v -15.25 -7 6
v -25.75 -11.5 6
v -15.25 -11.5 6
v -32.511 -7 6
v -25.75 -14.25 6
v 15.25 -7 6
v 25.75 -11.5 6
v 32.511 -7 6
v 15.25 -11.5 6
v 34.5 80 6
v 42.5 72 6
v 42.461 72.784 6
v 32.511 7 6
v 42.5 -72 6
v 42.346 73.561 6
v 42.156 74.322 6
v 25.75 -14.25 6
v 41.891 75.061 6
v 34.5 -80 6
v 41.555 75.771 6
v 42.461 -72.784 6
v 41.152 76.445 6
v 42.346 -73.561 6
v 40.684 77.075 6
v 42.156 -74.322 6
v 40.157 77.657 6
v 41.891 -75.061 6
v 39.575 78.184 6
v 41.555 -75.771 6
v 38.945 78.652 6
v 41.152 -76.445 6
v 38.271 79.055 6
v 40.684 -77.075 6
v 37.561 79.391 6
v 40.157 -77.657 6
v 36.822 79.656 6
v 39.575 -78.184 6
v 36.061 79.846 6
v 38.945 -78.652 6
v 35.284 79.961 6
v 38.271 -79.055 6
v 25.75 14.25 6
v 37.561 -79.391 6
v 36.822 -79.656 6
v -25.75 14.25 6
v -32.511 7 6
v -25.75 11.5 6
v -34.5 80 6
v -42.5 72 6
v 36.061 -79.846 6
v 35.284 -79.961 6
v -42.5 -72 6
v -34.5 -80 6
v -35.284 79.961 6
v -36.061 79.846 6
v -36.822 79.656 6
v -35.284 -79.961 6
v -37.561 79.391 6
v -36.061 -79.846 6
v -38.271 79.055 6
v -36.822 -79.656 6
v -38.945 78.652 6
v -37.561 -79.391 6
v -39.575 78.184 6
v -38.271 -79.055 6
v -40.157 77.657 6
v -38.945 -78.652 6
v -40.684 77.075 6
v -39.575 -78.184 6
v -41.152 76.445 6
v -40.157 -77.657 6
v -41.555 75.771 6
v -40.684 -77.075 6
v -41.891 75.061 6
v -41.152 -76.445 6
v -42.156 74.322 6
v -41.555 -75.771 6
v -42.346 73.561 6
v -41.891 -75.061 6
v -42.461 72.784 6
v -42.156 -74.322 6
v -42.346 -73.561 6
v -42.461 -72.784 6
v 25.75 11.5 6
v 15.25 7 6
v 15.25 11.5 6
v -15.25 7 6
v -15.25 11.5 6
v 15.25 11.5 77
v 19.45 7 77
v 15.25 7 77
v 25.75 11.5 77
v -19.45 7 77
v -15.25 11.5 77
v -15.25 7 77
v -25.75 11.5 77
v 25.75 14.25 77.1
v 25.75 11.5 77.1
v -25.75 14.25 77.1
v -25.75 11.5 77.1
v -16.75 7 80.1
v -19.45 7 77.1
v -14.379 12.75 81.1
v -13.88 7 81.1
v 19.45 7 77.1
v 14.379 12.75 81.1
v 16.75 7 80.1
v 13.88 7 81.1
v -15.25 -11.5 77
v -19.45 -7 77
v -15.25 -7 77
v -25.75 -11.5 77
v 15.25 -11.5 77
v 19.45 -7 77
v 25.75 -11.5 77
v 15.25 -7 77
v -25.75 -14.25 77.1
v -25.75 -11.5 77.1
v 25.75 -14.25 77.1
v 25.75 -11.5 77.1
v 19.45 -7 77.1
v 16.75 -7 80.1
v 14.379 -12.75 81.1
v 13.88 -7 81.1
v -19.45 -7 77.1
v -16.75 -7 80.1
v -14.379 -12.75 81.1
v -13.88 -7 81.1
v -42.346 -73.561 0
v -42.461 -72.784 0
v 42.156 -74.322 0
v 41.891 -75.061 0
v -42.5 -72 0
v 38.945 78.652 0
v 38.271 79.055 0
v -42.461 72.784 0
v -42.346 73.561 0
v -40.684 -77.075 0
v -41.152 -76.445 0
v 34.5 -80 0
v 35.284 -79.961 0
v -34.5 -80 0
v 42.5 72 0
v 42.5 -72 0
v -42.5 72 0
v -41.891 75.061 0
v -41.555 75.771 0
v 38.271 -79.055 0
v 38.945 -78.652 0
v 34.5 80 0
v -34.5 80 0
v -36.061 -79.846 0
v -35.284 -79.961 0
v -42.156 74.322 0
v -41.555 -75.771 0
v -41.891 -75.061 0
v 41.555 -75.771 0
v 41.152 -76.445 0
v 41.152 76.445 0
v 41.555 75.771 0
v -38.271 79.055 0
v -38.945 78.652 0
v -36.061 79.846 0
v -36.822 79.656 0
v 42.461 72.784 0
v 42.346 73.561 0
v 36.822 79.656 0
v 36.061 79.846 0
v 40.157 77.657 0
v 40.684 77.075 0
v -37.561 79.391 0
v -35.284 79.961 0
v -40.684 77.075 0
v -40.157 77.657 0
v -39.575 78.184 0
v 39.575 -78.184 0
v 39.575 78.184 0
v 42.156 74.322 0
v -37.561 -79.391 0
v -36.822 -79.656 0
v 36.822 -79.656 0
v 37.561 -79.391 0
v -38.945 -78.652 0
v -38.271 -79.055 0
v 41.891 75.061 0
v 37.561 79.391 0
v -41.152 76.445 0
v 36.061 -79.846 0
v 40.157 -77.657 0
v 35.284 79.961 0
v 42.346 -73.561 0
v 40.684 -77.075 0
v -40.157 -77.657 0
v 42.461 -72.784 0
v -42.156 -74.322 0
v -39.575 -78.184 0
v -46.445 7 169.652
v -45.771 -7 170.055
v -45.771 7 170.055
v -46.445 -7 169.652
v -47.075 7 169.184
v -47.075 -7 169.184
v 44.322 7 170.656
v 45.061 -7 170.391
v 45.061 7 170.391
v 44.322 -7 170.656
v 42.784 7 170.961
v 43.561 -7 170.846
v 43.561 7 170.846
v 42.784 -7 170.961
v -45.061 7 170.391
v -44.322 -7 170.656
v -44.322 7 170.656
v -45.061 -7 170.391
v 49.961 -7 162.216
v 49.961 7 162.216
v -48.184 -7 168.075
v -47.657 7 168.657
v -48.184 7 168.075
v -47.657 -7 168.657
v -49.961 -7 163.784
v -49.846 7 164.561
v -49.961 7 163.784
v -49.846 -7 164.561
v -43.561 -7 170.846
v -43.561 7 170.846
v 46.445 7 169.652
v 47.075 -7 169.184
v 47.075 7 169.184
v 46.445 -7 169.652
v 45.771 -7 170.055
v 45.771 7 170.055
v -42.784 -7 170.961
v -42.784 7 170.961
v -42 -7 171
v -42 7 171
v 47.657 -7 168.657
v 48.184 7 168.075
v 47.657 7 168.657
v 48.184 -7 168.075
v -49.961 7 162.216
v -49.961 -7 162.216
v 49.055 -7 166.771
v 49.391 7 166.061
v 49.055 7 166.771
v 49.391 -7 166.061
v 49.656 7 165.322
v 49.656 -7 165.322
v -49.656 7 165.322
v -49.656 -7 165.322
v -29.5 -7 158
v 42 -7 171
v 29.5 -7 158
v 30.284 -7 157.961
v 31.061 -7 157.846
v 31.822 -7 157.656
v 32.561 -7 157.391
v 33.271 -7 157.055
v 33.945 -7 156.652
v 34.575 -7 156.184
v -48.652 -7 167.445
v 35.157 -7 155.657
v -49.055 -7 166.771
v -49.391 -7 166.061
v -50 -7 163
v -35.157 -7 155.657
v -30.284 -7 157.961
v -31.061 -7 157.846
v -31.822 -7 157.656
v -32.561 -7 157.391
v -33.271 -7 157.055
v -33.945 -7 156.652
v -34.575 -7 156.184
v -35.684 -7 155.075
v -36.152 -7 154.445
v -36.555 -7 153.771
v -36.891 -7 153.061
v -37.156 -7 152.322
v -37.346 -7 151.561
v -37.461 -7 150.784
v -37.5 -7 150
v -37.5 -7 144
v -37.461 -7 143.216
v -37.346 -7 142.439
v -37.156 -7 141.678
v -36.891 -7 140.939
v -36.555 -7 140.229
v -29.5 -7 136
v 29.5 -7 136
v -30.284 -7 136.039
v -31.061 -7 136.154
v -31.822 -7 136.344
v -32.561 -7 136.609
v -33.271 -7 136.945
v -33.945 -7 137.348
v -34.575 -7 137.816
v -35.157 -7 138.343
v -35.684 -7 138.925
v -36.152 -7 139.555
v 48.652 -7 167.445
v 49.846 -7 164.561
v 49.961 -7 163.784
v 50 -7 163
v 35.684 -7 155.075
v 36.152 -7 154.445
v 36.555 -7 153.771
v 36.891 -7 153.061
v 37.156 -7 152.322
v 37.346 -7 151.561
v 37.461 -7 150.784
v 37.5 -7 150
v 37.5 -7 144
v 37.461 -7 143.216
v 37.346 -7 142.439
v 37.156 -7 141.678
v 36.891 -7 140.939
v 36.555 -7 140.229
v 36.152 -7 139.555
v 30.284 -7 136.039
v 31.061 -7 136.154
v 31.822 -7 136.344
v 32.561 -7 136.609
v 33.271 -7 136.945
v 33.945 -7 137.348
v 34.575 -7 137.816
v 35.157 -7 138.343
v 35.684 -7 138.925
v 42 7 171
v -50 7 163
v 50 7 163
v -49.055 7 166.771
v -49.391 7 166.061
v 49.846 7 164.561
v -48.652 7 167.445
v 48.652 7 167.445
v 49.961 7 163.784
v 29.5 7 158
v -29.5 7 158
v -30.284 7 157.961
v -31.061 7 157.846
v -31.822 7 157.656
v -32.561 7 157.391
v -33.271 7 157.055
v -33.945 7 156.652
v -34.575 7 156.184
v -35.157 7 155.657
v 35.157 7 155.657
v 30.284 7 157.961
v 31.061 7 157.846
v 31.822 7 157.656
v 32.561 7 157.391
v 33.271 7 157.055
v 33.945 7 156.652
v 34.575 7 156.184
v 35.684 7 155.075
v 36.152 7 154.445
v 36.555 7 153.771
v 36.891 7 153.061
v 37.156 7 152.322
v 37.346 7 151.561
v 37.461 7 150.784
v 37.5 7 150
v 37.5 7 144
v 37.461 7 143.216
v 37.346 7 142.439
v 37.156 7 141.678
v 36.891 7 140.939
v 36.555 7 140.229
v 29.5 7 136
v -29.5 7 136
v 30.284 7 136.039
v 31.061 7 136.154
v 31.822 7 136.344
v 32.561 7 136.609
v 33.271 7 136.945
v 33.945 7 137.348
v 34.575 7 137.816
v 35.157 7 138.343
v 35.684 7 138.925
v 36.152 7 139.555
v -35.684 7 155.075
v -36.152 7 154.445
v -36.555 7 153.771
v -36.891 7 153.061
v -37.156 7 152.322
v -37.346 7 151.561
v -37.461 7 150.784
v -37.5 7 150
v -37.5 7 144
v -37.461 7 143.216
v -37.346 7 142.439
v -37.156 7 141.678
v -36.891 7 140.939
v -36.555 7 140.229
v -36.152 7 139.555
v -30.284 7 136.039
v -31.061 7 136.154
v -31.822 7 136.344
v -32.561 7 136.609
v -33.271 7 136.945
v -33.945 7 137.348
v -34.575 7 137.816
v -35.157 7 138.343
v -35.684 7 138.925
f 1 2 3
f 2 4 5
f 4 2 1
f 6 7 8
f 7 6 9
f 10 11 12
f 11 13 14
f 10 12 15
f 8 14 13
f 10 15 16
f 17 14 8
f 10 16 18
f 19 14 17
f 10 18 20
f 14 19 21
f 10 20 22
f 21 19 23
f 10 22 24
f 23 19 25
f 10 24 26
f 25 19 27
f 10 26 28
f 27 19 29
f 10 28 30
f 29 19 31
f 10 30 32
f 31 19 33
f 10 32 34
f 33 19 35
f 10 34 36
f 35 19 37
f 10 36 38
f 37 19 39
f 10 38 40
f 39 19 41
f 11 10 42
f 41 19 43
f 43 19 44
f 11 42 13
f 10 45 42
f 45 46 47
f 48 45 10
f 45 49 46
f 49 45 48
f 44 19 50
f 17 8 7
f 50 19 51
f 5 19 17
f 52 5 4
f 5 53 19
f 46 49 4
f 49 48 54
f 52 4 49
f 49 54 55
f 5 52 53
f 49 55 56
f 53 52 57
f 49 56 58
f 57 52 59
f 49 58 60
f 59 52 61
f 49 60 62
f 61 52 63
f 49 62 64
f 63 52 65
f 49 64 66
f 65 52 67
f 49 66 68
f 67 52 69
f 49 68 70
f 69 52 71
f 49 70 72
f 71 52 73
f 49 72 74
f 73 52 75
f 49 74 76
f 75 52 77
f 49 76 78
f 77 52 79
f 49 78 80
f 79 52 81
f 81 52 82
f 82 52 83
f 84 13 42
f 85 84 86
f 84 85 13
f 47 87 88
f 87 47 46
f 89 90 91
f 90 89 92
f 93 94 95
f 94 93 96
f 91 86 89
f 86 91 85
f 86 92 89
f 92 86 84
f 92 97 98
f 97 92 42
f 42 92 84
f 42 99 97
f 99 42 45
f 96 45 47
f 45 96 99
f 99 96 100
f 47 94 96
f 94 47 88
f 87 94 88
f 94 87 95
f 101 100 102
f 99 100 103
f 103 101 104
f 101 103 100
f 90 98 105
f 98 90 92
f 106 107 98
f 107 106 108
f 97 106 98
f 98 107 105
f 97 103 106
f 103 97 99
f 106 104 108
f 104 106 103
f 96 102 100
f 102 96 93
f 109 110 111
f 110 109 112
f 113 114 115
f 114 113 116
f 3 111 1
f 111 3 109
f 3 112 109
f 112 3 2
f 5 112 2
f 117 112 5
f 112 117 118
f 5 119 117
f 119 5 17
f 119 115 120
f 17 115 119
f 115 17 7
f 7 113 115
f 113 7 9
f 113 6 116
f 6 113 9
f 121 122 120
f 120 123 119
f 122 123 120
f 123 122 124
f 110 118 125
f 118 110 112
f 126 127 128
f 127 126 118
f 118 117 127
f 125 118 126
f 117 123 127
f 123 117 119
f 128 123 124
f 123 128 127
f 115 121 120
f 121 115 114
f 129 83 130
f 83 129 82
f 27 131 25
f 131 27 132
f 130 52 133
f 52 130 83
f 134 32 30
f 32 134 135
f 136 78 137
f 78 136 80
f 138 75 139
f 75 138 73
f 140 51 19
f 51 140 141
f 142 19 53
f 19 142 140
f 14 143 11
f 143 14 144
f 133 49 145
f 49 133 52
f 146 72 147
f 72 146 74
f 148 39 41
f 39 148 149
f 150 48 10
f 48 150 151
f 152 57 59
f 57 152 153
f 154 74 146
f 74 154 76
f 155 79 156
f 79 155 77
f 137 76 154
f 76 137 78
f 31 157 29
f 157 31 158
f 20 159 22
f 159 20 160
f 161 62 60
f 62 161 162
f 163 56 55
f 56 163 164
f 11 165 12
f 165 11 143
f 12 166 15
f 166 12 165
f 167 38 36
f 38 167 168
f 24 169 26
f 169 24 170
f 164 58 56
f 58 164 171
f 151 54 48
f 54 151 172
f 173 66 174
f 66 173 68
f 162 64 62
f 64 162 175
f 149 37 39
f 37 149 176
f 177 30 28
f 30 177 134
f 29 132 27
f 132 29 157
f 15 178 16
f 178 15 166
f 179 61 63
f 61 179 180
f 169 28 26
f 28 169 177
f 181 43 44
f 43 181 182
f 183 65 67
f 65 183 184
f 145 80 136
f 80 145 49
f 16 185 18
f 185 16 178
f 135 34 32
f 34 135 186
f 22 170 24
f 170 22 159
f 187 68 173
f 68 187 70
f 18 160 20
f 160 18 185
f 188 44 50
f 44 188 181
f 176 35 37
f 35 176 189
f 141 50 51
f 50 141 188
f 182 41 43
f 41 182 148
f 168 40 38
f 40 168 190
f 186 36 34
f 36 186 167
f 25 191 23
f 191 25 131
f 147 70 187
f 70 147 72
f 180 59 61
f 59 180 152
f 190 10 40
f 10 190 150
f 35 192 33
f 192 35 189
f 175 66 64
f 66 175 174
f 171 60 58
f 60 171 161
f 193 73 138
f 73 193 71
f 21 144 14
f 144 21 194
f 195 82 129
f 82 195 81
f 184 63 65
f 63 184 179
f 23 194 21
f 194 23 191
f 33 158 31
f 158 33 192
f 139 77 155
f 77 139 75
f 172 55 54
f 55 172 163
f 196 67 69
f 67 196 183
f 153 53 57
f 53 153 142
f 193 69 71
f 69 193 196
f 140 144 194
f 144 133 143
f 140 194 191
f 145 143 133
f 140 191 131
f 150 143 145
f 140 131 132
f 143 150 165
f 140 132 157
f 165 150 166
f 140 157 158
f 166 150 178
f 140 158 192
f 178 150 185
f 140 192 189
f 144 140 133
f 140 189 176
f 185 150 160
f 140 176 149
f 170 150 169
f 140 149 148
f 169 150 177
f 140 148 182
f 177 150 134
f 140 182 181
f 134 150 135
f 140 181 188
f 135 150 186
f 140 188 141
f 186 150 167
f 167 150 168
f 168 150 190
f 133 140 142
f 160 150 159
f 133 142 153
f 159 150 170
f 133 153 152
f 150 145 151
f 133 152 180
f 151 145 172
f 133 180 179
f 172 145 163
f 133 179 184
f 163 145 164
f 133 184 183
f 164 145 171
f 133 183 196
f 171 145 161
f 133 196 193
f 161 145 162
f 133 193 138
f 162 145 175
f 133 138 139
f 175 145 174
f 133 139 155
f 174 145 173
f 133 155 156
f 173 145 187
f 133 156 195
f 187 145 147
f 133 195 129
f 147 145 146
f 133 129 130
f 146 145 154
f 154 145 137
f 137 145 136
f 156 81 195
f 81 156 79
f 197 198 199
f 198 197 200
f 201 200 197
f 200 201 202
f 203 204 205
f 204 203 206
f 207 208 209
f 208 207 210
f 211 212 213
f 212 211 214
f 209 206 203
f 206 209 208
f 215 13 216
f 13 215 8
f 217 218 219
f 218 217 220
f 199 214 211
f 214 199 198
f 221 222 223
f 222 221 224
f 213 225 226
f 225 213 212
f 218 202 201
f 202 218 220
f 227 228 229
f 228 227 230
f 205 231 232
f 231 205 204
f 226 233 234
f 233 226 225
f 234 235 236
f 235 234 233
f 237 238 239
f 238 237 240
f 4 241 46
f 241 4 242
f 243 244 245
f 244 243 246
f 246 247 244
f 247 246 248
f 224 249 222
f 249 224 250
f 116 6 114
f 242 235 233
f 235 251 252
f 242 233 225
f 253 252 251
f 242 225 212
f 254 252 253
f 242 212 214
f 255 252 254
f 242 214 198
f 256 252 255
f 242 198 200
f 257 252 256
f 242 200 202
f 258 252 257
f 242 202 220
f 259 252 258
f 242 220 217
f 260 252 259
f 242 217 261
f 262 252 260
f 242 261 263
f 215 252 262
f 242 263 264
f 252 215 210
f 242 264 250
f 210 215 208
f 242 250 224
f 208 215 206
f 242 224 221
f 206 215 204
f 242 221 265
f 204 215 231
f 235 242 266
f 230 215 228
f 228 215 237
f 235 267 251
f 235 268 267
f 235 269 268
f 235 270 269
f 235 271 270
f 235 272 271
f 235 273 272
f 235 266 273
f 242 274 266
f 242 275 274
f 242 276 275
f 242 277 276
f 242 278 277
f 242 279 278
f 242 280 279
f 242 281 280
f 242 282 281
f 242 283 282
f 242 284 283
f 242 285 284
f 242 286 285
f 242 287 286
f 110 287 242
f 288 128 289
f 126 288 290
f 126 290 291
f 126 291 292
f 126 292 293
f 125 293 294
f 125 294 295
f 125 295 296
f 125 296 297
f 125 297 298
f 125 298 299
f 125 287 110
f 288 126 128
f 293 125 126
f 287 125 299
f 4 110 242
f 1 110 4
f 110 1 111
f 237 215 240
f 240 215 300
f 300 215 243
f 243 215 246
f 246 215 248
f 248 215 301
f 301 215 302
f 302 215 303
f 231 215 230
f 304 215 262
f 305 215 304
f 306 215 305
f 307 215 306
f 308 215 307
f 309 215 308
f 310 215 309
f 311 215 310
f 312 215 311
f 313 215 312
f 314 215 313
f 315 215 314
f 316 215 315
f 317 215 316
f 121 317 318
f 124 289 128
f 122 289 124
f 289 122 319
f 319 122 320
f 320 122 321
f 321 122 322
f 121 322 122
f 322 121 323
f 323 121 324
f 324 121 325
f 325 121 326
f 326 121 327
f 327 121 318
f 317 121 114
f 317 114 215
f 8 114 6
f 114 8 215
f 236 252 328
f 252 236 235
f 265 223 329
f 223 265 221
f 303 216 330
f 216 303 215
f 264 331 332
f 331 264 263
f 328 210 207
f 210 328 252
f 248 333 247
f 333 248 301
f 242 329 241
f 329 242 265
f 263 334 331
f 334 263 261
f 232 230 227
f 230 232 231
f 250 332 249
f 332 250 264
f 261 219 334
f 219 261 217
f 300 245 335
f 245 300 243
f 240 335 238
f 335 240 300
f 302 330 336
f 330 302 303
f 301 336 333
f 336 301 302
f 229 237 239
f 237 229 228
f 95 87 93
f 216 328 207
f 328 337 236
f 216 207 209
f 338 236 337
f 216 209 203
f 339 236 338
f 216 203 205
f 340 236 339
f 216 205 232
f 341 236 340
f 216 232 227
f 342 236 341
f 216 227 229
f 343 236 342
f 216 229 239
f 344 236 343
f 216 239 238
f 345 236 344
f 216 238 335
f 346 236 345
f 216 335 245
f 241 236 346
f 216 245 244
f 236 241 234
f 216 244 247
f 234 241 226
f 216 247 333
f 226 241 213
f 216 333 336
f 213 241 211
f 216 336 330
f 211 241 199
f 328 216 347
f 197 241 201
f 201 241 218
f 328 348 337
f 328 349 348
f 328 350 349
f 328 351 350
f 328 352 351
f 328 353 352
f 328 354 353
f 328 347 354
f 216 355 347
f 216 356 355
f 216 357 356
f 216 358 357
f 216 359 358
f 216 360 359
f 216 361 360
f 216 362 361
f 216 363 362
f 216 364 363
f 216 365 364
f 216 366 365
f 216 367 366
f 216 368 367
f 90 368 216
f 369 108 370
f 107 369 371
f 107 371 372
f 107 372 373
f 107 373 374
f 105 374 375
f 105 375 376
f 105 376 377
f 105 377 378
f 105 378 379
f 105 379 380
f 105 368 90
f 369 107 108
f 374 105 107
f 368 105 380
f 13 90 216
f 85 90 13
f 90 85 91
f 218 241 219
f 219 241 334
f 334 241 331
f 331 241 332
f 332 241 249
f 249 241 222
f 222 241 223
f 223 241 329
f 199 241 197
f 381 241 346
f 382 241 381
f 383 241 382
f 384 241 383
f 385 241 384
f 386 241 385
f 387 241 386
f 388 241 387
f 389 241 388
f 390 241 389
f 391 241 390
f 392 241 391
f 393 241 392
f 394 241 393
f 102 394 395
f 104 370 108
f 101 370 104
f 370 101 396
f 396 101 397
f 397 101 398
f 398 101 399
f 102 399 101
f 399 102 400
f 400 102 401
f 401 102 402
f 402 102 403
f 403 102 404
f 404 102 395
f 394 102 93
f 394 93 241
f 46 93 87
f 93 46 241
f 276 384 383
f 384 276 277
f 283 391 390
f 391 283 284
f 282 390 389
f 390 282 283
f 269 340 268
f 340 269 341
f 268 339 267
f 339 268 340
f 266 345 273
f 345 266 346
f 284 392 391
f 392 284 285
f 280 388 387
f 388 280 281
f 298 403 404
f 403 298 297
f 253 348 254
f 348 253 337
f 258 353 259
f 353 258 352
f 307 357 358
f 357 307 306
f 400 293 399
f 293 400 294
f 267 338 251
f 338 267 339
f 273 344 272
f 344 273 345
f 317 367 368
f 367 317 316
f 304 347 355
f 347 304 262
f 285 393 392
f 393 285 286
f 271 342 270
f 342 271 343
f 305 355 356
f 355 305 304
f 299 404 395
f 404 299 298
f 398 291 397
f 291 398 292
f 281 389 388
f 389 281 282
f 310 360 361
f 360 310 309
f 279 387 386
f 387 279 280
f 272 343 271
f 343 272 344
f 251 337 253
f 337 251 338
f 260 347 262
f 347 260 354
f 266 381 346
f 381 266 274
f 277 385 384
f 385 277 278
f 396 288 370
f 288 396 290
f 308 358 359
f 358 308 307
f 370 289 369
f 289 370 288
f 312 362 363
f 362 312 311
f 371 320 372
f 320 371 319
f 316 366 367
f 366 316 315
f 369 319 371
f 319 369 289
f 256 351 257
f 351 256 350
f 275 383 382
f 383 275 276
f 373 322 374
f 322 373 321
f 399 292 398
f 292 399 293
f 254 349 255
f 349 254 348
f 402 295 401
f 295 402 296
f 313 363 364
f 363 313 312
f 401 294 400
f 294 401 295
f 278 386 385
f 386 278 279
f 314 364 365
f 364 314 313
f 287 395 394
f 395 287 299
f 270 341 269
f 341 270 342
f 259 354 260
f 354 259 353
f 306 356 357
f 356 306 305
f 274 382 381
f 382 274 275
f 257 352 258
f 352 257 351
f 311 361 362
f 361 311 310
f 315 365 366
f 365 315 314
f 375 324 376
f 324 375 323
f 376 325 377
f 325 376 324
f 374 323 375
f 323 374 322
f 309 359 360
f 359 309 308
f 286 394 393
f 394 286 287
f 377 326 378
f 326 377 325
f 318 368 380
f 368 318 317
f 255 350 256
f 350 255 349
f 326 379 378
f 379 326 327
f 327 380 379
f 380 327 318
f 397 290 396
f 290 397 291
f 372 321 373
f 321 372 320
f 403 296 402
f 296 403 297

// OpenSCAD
// Makita-2xLXT-Carry-Handle.scad
// v0.01

/* [General Settings] */
// Gap/tolerance for easy sliding (increase if too tight)
tolerance = 0.5;

/* [Base Settings] */
// Width of the base (left to right)
base_x = 85;
// Depth of the base (front to back) - must fit two batteries back-to-back
base_y = 160;
// Thickness of the base
base_z = 6;
// Corner radius of the base
base_radius = 8;

/* [Pillar Settings] */
// Width of the central pillar
pillar_x = 55;
// Thickness of the central pillar wall separating the batteries
wall_y = 14;
// Height to clear the batteries before the handle starts
battery_clearance_z = 120;

/* [Handle Settings] */
// Outer width of the top handle part
handle_x = 100;
// Total height of the handle section
handle_z = 45;
// Width of the finger cutout
handle_hole_x = 75;
// Height of the finger cutout
handle_hole_z = 22;
// Rounding radius for the handle and hole
handle_radius = 8;

/* [Makita Slide Settings] */
// Length of the sliding rails
slide_length = 75;
// Standard stem width before tolerance
stem_w_base = 31.0;
// Standard stem depth before tolerance
stem_h_base = 4.0;
// Standard rail width before tolerance
rail_w_base = 52.0;
// Standard rail thickness before tolerance
rail_h_base = 3.0;

/* [Hidden] */
$fn = 64;

// Calculated rail dimensions with tolerances
stem_w = stem_w_base - tolerance;
stem_h = stem_h_base + tolerance;
rail_w = rail_w_base - tolerance;
rail_h = rail_h_base - tolerance/2;

// Total height of the model
total_z = base_z + battery_clearance_z + handle_z;


// --- Helper Modules ---

module rounded_rect(w, h, r) {
    hull() {
        translate([-w/2 + r, -h/2 + r]) circle(r);
        translate([w/2 - r, -h/2 + r]) circle(r);
        translate([-w/2 + r, h/2 - r]) circle(r);
        translate([w/2 - r, h/2 - r]) circle(r);
    }
}

module rounded_box(w, d, h, r) {
    linear_extrude(h, center=true)
    rounded_rect(w, d, r);
}


// --- Main Components ---

module t_track_profile() {
    union() {
        // Stem (goes deep to cleanly overlap the central wall)
        translate([-stem_w/2, -3]) square([stem_w, stem_h + 3]);
        // Top cross rail
        translate([-rail_w/2, stem_h]) square([rail_w, rail_h]);
    }
}

module makita_slide_single() {
    // Extrude main slide body
    linear_extrude(slide_length - 4)
    t_track_profile();

    // Extrude smoothly tapered top for easy insertion
    translate([0, 0, slide_length - 4])
    hull() {
        linear_extrude(0.1)
        t_track_profile();

        translate([0, 0, 4])
        linear_extrude(0.1)
        offset(delta=-1.5, chamfer=true)
        t_track_profile();
    }
}

module makita_slides() {
    // Front slide (+Y side)
    translate([0, wall_y/2, base_z])
    makita_slide_single();

    // Back slide (-Y side)
    translate([0, -wall_y/2, base_z])
    rotate([0, 0, 180])
    makita_slide_single();
}

module handle_profile() {
    hull() {
        // Base footprint (wider to create a fillet for strength)
        translate([-pillar_x/2 - 5, base_z - 0.1]) square([pillar_x + 10, 1.1]);

        // Main central pillar body
        translate([-pillar_x/2, base_z + 1]) square([pillar_x, battery_clearance_z - 1]);

        // Handle widened top
        translate([-handle_x/2 + handle_radius, total_z - handle_radius])
        circle(handle_radius);

        translate([handle_x/2 - handle_radius, total_z - handle_radius])
        circle(handle_radius);
    }
}

module central_body() {
    rotate([90, 0, 0])
    linear_extrude(wall_y, center=true)
    handle_profile();
}

module handle_hole() {
    // Calculate the Z-center of the hole to leave a strong top bridge
    meat_above_hole = handle_radius + 5;
    hole_z = total_z - meat_above_hole - handle_hole_z/2;

    translate([0, 0, hole_z])
    rotate([90, 0, 0])
    // Make the cutout slightly wider than the wall to ensure clean intersection
    linear_extrude(wall_y + 2, center=true)
    rounded_rect(handle_hole_x, handle_hole_z, handle_radius);
}

// --- Assembly ---

module main() {
    difference() {
        union() {
            // Flat base for standing on the floor
            translate([0, 0, base_z/2])
            rounded_box(base_x, base_y, base_z, base_radius);

            // The central wall and top handle
            central_body();

            // The slide rails for the batteries
            makita_slides();
        }

        // Subtract the finger grip cutout
        handle_hole();
    }
}

// Render everything
main();
